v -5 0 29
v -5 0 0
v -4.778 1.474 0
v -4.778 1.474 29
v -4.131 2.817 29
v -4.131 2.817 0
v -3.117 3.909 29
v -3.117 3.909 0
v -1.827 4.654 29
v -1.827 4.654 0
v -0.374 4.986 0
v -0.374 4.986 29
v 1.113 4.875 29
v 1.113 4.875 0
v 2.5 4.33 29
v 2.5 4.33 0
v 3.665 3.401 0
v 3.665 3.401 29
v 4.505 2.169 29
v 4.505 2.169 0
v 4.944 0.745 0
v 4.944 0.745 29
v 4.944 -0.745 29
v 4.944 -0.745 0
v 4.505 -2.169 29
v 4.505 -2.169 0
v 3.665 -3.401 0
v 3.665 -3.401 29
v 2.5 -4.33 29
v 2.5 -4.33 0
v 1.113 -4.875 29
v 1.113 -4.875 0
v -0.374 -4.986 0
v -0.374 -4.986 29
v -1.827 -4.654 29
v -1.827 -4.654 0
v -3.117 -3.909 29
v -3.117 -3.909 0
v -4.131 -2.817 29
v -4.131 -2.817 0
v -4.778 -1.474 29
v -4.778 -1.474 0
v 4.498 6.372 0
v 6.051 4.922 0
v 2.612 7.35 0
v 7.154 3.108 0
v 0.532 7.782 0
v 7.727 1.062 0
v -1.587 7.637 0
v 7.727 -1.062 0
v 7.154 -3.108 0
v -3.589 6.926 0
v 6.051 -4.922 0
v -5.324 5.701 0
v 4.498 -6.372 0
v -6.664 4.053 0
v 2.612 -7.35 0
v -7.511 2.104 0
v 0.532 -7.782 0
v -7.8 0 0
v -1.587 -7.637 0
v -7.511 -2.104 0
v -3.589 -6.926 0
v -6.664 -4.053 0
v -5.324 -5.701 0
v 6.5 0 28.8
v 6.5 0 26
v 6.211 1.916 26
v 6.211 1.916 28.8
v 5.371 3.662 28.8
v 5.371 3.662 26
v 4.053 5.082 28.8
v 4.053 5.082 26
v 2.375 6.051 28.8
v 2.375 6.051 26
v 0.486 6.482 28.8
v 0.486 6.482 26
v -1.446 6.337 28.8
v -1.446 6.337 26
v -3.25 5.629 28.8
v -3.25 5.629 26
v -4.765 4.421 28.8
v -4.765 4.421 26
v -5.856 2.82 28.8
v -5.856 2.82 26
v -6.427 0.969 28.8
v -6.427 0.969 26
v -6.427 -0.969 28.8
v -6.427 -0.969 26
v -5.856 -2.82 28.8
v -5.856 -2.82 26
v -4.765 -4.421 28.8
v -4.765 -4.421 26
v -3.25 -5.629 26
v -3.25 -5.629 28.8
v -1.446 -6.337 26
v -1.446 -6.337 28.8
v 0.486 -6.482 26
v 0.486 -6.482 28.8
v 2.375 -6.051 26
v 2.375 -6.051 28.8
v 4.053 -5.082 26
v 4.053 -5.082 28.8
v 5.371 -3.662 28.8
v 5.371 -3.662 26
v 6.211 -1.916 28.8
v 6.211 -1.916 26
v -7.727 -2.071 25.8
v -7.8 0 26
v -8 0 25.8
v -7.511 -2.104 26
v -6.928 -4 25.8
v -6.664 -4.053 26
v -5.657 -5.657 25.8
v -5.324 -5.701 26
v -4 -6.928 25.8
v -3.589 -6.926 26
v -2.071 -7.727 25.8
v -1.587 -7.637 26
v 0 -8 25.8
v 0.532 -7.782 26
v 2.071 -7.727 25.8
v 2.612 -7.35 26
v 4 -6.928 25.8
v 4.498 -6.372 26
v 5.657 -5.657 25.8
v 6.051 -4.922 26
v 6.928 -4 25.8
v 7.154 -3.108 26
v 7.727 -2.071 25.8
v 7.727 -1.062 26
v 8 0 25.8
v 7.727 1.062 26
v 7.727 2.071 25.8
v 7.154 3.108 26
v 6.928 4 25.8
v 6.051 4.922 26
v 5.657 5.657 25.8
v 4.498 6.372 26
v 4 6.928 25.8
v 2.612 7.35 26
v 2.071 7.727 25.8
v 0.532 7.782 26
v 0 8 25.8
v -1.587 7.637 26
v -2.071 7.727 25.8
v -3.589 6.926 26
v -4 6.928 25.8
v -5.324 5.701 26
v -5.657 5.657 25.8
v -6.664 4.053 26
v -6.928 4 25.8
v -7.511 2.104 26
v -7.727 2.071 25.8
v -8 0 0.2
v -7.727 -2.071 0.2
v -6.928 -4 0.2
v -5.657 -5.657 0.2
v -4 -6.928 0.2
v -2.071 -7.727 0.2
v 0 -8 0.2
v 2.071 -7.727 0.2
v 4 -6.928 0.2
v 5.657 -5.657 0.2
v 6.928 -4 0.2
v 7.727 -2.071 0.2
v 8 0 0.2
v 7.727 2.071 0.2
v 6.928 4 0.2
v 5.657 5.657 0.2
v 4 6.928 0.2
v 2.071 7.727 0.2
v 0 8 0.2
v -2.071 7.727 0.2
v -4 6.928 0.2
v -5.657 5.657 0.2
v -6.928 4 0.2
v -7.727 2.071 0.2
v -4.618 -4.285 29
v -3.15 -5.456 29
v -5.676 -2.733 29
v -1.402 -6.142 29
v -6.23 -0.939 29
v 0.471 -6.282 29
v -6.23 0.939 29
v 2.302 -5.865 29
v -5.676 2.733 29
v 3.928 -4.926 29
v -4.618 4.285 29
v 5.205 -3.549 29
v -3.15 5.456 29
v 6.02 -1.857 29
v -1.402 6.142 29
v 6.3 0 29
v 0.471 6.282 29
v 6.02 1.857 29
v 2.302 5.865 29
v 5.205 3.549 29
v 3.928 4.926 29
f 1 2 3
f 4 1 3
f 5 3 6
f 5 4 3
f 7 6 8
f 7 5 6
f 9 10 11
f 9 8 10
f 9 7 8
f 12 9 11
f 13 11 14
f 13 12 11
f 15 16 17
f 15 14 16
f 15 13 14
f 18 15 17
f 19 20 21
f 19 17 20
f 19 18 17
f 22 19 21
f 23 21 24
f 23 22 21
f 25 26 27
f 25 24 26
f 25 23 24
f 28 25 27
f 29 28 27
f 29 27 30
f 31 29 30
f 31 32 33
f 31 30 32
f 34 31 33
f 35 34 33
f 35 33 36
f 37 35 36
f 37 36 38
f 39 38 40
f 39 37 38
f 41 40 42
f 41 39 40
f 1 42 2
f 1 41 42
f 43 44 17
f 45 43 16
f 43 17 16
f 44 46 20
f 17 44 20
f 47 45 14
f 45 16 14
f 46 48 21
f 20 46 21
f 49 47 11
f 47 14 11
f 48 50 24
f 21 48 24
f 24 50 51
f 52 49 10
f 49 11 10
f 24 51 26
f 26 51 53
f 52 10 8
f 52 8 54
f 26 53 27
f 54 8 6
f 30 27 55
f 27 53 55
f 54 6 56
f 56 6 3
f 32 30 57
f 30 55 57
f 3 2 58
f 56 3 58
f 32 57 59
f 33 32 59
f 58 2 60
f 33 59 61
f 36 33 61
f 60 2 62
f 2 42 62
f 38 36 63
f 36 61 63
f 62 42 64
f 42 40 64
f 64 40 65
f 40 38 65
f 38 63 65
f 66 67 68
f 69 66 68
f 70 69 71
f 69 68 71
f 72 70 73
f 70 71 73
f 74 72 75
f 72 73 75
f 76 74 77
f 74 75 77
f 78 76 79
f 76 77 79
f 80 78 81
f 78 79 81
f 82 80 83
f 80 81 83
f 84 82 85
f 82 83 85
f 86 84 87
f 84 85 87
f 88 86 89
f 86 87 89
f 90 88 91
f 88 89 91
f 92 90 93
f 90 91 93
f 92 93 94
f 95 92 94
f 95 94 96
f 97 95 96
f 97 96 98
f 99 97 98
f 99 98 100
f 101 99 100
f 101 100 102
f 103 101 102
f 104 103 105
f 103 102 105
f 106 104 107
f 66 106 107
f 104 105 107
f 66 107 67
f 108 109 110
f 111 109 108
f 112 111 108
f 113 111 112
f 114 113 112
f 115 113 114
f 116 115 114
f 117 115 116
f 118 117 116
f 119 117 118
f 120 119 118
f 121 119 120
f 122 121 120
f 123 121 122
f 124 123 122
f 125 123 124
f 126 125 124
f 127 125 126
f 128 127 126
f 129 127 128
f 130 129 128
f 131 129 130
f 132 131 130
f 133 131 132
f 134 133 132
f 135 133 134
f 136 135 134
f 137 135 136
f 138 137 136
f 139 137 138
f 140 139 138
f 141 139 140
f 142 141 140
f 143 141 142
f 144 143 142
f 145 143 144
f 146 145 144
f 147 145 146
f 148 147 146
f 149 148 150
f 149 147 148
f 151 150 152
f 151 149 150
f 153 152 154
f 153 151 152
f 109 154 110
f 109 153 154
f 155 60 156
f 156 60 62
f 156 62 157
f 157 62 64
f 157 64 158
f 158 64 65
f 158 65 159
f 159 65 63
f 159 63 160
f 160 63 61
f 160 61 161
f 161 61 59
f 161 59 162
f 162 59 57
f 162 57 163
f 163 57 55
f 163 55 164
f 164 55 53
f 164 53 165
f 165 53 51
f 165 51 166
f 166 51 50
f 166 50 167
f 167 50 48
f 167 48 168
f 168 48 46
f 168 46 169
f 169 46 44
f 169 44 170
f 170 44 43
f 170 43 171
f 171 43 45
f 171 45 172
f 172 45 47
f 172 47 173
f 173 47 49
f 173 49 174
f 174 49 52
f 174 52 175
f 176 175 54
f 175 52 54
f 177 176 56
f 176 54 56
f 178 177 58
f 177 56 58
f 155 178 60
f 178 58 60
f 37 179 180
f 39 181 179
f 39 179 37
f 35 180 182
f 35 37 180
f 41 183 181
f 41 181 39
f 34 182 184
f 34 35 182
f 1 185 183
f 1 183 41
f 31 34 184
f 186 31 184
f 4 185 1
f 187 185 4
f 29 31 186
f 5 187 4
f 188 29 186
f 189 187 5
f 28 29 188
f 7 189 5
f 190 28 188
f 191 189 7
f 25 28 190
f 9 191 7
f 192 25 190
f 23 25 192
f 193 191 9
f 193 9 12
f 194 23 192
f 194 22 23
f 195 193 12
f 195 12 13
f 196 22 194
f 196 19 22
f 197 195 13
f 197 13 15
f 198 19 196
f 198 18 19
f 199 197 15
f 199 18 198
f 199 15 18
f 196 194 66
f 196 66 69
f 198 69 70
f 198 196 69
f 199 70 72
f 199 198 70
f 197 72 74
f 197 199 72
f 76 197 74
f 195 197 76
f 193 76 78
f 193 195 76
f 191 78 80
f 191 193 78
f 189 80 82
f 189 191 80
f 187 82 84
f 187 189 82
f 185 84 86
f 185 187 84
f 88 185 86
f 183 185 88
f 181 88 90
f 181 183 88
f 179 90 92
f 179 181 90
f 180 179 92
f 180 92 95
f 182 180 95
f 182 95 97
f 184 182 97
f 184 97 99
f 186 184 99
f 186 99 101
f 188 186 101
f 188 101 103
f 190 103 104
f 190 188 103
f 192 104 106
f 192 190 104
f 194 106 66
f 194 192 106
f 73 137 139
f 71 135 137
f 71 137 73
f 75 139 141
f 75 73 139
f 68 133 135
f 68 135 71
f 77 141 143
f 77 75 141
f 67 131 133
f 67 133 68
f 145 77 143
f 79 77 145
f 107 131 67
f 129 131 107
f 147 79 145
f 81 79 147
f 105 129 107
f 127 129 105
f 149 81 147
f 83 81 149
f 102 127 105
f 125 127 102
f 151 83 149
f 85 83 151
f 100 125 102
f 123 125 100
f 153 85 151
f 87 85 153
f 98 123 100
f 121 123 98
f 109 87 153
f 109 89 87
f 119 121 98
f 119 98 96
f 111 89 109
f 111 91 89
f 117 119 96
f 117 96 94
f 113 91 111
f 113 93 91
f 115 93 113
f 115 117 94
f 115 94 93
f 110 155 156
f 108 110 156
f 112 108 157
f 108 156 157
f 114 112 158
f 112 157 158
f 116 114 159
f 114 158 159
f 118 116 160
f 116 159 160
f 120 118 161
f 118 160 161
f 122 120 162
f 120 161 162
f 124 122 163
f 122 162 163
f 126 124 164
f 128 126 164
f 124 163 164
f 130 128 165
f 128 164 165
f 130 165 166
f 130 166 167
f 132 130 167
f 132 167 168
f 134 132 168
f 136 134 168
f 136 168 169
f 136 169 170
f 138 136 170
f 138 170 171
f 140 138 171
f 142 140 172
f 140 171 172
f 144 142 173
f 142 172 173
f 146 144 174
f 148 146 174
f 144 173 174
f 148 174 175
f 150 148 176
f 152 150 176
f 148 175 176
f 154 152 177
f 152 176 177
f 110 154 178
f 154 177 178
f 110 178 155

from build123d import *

# Parameters (mm, degrees)
SKIZZE1_R                            = 8
AUFSATZ_LINEAR_AUSTRAGEN1_DEPTH      = 26
SKIZZE2_R                            = 6.5
AUFSATZ_LINEAR_AUSTRAGEN2_DEPTH      = 3
SCHNITT_LINEAR_AUSTRAGEN1_DEPTH      = 32.128764833
SCHNITT_LINEAR_AUSTRAGEN1_DEPTH_BACK = 32.128764833
SKIZZE3_R                            = 5
FASE1_SIZE                           = 0.2


with BuildPart() as part:
    # Skizze1 → Aufsatz-Linear austragen1 (new body)
    with BuildSketch(Plane.XY):
        with Locations(Location((0, 0, 0), (0, 0, 180))):
            Circle(SKIZZE1_R)
    extrude(amount=AUFSATZ_LINEAR_AUSTRAGEN1_DEPTH)

    # Skizze2 → Aufsatz-Linear austragen2 (add)
    with BuildSketch(Plane.XY.offset(26)):
        Circle(SKIZZE2_R)
    extrude(amount=AUFSATZ_LINEAR_AUSTRAGEN2_DEPTH)

    # Skizze3 → Schnitt-Linear austragen1 (cut, two sides: drawn at the far end of the back side and taken through both)
    with BuildSketch(Plane(origin=(0, 0, 0), x_dir=(-1, 0, 0), z_dir=(0, 0, -1)).offset(-SCHNITT_LINEAR_AUSTRAGEN1_DEPTH_BACK)):
        Circle(SKIZZE3_R)
    extrude(amount=SCHNITT_LINEAR_AUSTRAGEN1_DEPTH + SCHNITT_LINEAR_AUSTRAGEN1_DEPTH_BACK, mode=Mode.SUBTRACT)

    # Fase1
    fase1_edges = [part.edges().sort_by_distance(p)[0] for p in [
        (8, 0, 0),
        (8, 0, 26),
        (-6.5, 0, 29),
    ]]
    chamfer(fase1_edges, length=FASE1_SIZE)


solid = part.part
